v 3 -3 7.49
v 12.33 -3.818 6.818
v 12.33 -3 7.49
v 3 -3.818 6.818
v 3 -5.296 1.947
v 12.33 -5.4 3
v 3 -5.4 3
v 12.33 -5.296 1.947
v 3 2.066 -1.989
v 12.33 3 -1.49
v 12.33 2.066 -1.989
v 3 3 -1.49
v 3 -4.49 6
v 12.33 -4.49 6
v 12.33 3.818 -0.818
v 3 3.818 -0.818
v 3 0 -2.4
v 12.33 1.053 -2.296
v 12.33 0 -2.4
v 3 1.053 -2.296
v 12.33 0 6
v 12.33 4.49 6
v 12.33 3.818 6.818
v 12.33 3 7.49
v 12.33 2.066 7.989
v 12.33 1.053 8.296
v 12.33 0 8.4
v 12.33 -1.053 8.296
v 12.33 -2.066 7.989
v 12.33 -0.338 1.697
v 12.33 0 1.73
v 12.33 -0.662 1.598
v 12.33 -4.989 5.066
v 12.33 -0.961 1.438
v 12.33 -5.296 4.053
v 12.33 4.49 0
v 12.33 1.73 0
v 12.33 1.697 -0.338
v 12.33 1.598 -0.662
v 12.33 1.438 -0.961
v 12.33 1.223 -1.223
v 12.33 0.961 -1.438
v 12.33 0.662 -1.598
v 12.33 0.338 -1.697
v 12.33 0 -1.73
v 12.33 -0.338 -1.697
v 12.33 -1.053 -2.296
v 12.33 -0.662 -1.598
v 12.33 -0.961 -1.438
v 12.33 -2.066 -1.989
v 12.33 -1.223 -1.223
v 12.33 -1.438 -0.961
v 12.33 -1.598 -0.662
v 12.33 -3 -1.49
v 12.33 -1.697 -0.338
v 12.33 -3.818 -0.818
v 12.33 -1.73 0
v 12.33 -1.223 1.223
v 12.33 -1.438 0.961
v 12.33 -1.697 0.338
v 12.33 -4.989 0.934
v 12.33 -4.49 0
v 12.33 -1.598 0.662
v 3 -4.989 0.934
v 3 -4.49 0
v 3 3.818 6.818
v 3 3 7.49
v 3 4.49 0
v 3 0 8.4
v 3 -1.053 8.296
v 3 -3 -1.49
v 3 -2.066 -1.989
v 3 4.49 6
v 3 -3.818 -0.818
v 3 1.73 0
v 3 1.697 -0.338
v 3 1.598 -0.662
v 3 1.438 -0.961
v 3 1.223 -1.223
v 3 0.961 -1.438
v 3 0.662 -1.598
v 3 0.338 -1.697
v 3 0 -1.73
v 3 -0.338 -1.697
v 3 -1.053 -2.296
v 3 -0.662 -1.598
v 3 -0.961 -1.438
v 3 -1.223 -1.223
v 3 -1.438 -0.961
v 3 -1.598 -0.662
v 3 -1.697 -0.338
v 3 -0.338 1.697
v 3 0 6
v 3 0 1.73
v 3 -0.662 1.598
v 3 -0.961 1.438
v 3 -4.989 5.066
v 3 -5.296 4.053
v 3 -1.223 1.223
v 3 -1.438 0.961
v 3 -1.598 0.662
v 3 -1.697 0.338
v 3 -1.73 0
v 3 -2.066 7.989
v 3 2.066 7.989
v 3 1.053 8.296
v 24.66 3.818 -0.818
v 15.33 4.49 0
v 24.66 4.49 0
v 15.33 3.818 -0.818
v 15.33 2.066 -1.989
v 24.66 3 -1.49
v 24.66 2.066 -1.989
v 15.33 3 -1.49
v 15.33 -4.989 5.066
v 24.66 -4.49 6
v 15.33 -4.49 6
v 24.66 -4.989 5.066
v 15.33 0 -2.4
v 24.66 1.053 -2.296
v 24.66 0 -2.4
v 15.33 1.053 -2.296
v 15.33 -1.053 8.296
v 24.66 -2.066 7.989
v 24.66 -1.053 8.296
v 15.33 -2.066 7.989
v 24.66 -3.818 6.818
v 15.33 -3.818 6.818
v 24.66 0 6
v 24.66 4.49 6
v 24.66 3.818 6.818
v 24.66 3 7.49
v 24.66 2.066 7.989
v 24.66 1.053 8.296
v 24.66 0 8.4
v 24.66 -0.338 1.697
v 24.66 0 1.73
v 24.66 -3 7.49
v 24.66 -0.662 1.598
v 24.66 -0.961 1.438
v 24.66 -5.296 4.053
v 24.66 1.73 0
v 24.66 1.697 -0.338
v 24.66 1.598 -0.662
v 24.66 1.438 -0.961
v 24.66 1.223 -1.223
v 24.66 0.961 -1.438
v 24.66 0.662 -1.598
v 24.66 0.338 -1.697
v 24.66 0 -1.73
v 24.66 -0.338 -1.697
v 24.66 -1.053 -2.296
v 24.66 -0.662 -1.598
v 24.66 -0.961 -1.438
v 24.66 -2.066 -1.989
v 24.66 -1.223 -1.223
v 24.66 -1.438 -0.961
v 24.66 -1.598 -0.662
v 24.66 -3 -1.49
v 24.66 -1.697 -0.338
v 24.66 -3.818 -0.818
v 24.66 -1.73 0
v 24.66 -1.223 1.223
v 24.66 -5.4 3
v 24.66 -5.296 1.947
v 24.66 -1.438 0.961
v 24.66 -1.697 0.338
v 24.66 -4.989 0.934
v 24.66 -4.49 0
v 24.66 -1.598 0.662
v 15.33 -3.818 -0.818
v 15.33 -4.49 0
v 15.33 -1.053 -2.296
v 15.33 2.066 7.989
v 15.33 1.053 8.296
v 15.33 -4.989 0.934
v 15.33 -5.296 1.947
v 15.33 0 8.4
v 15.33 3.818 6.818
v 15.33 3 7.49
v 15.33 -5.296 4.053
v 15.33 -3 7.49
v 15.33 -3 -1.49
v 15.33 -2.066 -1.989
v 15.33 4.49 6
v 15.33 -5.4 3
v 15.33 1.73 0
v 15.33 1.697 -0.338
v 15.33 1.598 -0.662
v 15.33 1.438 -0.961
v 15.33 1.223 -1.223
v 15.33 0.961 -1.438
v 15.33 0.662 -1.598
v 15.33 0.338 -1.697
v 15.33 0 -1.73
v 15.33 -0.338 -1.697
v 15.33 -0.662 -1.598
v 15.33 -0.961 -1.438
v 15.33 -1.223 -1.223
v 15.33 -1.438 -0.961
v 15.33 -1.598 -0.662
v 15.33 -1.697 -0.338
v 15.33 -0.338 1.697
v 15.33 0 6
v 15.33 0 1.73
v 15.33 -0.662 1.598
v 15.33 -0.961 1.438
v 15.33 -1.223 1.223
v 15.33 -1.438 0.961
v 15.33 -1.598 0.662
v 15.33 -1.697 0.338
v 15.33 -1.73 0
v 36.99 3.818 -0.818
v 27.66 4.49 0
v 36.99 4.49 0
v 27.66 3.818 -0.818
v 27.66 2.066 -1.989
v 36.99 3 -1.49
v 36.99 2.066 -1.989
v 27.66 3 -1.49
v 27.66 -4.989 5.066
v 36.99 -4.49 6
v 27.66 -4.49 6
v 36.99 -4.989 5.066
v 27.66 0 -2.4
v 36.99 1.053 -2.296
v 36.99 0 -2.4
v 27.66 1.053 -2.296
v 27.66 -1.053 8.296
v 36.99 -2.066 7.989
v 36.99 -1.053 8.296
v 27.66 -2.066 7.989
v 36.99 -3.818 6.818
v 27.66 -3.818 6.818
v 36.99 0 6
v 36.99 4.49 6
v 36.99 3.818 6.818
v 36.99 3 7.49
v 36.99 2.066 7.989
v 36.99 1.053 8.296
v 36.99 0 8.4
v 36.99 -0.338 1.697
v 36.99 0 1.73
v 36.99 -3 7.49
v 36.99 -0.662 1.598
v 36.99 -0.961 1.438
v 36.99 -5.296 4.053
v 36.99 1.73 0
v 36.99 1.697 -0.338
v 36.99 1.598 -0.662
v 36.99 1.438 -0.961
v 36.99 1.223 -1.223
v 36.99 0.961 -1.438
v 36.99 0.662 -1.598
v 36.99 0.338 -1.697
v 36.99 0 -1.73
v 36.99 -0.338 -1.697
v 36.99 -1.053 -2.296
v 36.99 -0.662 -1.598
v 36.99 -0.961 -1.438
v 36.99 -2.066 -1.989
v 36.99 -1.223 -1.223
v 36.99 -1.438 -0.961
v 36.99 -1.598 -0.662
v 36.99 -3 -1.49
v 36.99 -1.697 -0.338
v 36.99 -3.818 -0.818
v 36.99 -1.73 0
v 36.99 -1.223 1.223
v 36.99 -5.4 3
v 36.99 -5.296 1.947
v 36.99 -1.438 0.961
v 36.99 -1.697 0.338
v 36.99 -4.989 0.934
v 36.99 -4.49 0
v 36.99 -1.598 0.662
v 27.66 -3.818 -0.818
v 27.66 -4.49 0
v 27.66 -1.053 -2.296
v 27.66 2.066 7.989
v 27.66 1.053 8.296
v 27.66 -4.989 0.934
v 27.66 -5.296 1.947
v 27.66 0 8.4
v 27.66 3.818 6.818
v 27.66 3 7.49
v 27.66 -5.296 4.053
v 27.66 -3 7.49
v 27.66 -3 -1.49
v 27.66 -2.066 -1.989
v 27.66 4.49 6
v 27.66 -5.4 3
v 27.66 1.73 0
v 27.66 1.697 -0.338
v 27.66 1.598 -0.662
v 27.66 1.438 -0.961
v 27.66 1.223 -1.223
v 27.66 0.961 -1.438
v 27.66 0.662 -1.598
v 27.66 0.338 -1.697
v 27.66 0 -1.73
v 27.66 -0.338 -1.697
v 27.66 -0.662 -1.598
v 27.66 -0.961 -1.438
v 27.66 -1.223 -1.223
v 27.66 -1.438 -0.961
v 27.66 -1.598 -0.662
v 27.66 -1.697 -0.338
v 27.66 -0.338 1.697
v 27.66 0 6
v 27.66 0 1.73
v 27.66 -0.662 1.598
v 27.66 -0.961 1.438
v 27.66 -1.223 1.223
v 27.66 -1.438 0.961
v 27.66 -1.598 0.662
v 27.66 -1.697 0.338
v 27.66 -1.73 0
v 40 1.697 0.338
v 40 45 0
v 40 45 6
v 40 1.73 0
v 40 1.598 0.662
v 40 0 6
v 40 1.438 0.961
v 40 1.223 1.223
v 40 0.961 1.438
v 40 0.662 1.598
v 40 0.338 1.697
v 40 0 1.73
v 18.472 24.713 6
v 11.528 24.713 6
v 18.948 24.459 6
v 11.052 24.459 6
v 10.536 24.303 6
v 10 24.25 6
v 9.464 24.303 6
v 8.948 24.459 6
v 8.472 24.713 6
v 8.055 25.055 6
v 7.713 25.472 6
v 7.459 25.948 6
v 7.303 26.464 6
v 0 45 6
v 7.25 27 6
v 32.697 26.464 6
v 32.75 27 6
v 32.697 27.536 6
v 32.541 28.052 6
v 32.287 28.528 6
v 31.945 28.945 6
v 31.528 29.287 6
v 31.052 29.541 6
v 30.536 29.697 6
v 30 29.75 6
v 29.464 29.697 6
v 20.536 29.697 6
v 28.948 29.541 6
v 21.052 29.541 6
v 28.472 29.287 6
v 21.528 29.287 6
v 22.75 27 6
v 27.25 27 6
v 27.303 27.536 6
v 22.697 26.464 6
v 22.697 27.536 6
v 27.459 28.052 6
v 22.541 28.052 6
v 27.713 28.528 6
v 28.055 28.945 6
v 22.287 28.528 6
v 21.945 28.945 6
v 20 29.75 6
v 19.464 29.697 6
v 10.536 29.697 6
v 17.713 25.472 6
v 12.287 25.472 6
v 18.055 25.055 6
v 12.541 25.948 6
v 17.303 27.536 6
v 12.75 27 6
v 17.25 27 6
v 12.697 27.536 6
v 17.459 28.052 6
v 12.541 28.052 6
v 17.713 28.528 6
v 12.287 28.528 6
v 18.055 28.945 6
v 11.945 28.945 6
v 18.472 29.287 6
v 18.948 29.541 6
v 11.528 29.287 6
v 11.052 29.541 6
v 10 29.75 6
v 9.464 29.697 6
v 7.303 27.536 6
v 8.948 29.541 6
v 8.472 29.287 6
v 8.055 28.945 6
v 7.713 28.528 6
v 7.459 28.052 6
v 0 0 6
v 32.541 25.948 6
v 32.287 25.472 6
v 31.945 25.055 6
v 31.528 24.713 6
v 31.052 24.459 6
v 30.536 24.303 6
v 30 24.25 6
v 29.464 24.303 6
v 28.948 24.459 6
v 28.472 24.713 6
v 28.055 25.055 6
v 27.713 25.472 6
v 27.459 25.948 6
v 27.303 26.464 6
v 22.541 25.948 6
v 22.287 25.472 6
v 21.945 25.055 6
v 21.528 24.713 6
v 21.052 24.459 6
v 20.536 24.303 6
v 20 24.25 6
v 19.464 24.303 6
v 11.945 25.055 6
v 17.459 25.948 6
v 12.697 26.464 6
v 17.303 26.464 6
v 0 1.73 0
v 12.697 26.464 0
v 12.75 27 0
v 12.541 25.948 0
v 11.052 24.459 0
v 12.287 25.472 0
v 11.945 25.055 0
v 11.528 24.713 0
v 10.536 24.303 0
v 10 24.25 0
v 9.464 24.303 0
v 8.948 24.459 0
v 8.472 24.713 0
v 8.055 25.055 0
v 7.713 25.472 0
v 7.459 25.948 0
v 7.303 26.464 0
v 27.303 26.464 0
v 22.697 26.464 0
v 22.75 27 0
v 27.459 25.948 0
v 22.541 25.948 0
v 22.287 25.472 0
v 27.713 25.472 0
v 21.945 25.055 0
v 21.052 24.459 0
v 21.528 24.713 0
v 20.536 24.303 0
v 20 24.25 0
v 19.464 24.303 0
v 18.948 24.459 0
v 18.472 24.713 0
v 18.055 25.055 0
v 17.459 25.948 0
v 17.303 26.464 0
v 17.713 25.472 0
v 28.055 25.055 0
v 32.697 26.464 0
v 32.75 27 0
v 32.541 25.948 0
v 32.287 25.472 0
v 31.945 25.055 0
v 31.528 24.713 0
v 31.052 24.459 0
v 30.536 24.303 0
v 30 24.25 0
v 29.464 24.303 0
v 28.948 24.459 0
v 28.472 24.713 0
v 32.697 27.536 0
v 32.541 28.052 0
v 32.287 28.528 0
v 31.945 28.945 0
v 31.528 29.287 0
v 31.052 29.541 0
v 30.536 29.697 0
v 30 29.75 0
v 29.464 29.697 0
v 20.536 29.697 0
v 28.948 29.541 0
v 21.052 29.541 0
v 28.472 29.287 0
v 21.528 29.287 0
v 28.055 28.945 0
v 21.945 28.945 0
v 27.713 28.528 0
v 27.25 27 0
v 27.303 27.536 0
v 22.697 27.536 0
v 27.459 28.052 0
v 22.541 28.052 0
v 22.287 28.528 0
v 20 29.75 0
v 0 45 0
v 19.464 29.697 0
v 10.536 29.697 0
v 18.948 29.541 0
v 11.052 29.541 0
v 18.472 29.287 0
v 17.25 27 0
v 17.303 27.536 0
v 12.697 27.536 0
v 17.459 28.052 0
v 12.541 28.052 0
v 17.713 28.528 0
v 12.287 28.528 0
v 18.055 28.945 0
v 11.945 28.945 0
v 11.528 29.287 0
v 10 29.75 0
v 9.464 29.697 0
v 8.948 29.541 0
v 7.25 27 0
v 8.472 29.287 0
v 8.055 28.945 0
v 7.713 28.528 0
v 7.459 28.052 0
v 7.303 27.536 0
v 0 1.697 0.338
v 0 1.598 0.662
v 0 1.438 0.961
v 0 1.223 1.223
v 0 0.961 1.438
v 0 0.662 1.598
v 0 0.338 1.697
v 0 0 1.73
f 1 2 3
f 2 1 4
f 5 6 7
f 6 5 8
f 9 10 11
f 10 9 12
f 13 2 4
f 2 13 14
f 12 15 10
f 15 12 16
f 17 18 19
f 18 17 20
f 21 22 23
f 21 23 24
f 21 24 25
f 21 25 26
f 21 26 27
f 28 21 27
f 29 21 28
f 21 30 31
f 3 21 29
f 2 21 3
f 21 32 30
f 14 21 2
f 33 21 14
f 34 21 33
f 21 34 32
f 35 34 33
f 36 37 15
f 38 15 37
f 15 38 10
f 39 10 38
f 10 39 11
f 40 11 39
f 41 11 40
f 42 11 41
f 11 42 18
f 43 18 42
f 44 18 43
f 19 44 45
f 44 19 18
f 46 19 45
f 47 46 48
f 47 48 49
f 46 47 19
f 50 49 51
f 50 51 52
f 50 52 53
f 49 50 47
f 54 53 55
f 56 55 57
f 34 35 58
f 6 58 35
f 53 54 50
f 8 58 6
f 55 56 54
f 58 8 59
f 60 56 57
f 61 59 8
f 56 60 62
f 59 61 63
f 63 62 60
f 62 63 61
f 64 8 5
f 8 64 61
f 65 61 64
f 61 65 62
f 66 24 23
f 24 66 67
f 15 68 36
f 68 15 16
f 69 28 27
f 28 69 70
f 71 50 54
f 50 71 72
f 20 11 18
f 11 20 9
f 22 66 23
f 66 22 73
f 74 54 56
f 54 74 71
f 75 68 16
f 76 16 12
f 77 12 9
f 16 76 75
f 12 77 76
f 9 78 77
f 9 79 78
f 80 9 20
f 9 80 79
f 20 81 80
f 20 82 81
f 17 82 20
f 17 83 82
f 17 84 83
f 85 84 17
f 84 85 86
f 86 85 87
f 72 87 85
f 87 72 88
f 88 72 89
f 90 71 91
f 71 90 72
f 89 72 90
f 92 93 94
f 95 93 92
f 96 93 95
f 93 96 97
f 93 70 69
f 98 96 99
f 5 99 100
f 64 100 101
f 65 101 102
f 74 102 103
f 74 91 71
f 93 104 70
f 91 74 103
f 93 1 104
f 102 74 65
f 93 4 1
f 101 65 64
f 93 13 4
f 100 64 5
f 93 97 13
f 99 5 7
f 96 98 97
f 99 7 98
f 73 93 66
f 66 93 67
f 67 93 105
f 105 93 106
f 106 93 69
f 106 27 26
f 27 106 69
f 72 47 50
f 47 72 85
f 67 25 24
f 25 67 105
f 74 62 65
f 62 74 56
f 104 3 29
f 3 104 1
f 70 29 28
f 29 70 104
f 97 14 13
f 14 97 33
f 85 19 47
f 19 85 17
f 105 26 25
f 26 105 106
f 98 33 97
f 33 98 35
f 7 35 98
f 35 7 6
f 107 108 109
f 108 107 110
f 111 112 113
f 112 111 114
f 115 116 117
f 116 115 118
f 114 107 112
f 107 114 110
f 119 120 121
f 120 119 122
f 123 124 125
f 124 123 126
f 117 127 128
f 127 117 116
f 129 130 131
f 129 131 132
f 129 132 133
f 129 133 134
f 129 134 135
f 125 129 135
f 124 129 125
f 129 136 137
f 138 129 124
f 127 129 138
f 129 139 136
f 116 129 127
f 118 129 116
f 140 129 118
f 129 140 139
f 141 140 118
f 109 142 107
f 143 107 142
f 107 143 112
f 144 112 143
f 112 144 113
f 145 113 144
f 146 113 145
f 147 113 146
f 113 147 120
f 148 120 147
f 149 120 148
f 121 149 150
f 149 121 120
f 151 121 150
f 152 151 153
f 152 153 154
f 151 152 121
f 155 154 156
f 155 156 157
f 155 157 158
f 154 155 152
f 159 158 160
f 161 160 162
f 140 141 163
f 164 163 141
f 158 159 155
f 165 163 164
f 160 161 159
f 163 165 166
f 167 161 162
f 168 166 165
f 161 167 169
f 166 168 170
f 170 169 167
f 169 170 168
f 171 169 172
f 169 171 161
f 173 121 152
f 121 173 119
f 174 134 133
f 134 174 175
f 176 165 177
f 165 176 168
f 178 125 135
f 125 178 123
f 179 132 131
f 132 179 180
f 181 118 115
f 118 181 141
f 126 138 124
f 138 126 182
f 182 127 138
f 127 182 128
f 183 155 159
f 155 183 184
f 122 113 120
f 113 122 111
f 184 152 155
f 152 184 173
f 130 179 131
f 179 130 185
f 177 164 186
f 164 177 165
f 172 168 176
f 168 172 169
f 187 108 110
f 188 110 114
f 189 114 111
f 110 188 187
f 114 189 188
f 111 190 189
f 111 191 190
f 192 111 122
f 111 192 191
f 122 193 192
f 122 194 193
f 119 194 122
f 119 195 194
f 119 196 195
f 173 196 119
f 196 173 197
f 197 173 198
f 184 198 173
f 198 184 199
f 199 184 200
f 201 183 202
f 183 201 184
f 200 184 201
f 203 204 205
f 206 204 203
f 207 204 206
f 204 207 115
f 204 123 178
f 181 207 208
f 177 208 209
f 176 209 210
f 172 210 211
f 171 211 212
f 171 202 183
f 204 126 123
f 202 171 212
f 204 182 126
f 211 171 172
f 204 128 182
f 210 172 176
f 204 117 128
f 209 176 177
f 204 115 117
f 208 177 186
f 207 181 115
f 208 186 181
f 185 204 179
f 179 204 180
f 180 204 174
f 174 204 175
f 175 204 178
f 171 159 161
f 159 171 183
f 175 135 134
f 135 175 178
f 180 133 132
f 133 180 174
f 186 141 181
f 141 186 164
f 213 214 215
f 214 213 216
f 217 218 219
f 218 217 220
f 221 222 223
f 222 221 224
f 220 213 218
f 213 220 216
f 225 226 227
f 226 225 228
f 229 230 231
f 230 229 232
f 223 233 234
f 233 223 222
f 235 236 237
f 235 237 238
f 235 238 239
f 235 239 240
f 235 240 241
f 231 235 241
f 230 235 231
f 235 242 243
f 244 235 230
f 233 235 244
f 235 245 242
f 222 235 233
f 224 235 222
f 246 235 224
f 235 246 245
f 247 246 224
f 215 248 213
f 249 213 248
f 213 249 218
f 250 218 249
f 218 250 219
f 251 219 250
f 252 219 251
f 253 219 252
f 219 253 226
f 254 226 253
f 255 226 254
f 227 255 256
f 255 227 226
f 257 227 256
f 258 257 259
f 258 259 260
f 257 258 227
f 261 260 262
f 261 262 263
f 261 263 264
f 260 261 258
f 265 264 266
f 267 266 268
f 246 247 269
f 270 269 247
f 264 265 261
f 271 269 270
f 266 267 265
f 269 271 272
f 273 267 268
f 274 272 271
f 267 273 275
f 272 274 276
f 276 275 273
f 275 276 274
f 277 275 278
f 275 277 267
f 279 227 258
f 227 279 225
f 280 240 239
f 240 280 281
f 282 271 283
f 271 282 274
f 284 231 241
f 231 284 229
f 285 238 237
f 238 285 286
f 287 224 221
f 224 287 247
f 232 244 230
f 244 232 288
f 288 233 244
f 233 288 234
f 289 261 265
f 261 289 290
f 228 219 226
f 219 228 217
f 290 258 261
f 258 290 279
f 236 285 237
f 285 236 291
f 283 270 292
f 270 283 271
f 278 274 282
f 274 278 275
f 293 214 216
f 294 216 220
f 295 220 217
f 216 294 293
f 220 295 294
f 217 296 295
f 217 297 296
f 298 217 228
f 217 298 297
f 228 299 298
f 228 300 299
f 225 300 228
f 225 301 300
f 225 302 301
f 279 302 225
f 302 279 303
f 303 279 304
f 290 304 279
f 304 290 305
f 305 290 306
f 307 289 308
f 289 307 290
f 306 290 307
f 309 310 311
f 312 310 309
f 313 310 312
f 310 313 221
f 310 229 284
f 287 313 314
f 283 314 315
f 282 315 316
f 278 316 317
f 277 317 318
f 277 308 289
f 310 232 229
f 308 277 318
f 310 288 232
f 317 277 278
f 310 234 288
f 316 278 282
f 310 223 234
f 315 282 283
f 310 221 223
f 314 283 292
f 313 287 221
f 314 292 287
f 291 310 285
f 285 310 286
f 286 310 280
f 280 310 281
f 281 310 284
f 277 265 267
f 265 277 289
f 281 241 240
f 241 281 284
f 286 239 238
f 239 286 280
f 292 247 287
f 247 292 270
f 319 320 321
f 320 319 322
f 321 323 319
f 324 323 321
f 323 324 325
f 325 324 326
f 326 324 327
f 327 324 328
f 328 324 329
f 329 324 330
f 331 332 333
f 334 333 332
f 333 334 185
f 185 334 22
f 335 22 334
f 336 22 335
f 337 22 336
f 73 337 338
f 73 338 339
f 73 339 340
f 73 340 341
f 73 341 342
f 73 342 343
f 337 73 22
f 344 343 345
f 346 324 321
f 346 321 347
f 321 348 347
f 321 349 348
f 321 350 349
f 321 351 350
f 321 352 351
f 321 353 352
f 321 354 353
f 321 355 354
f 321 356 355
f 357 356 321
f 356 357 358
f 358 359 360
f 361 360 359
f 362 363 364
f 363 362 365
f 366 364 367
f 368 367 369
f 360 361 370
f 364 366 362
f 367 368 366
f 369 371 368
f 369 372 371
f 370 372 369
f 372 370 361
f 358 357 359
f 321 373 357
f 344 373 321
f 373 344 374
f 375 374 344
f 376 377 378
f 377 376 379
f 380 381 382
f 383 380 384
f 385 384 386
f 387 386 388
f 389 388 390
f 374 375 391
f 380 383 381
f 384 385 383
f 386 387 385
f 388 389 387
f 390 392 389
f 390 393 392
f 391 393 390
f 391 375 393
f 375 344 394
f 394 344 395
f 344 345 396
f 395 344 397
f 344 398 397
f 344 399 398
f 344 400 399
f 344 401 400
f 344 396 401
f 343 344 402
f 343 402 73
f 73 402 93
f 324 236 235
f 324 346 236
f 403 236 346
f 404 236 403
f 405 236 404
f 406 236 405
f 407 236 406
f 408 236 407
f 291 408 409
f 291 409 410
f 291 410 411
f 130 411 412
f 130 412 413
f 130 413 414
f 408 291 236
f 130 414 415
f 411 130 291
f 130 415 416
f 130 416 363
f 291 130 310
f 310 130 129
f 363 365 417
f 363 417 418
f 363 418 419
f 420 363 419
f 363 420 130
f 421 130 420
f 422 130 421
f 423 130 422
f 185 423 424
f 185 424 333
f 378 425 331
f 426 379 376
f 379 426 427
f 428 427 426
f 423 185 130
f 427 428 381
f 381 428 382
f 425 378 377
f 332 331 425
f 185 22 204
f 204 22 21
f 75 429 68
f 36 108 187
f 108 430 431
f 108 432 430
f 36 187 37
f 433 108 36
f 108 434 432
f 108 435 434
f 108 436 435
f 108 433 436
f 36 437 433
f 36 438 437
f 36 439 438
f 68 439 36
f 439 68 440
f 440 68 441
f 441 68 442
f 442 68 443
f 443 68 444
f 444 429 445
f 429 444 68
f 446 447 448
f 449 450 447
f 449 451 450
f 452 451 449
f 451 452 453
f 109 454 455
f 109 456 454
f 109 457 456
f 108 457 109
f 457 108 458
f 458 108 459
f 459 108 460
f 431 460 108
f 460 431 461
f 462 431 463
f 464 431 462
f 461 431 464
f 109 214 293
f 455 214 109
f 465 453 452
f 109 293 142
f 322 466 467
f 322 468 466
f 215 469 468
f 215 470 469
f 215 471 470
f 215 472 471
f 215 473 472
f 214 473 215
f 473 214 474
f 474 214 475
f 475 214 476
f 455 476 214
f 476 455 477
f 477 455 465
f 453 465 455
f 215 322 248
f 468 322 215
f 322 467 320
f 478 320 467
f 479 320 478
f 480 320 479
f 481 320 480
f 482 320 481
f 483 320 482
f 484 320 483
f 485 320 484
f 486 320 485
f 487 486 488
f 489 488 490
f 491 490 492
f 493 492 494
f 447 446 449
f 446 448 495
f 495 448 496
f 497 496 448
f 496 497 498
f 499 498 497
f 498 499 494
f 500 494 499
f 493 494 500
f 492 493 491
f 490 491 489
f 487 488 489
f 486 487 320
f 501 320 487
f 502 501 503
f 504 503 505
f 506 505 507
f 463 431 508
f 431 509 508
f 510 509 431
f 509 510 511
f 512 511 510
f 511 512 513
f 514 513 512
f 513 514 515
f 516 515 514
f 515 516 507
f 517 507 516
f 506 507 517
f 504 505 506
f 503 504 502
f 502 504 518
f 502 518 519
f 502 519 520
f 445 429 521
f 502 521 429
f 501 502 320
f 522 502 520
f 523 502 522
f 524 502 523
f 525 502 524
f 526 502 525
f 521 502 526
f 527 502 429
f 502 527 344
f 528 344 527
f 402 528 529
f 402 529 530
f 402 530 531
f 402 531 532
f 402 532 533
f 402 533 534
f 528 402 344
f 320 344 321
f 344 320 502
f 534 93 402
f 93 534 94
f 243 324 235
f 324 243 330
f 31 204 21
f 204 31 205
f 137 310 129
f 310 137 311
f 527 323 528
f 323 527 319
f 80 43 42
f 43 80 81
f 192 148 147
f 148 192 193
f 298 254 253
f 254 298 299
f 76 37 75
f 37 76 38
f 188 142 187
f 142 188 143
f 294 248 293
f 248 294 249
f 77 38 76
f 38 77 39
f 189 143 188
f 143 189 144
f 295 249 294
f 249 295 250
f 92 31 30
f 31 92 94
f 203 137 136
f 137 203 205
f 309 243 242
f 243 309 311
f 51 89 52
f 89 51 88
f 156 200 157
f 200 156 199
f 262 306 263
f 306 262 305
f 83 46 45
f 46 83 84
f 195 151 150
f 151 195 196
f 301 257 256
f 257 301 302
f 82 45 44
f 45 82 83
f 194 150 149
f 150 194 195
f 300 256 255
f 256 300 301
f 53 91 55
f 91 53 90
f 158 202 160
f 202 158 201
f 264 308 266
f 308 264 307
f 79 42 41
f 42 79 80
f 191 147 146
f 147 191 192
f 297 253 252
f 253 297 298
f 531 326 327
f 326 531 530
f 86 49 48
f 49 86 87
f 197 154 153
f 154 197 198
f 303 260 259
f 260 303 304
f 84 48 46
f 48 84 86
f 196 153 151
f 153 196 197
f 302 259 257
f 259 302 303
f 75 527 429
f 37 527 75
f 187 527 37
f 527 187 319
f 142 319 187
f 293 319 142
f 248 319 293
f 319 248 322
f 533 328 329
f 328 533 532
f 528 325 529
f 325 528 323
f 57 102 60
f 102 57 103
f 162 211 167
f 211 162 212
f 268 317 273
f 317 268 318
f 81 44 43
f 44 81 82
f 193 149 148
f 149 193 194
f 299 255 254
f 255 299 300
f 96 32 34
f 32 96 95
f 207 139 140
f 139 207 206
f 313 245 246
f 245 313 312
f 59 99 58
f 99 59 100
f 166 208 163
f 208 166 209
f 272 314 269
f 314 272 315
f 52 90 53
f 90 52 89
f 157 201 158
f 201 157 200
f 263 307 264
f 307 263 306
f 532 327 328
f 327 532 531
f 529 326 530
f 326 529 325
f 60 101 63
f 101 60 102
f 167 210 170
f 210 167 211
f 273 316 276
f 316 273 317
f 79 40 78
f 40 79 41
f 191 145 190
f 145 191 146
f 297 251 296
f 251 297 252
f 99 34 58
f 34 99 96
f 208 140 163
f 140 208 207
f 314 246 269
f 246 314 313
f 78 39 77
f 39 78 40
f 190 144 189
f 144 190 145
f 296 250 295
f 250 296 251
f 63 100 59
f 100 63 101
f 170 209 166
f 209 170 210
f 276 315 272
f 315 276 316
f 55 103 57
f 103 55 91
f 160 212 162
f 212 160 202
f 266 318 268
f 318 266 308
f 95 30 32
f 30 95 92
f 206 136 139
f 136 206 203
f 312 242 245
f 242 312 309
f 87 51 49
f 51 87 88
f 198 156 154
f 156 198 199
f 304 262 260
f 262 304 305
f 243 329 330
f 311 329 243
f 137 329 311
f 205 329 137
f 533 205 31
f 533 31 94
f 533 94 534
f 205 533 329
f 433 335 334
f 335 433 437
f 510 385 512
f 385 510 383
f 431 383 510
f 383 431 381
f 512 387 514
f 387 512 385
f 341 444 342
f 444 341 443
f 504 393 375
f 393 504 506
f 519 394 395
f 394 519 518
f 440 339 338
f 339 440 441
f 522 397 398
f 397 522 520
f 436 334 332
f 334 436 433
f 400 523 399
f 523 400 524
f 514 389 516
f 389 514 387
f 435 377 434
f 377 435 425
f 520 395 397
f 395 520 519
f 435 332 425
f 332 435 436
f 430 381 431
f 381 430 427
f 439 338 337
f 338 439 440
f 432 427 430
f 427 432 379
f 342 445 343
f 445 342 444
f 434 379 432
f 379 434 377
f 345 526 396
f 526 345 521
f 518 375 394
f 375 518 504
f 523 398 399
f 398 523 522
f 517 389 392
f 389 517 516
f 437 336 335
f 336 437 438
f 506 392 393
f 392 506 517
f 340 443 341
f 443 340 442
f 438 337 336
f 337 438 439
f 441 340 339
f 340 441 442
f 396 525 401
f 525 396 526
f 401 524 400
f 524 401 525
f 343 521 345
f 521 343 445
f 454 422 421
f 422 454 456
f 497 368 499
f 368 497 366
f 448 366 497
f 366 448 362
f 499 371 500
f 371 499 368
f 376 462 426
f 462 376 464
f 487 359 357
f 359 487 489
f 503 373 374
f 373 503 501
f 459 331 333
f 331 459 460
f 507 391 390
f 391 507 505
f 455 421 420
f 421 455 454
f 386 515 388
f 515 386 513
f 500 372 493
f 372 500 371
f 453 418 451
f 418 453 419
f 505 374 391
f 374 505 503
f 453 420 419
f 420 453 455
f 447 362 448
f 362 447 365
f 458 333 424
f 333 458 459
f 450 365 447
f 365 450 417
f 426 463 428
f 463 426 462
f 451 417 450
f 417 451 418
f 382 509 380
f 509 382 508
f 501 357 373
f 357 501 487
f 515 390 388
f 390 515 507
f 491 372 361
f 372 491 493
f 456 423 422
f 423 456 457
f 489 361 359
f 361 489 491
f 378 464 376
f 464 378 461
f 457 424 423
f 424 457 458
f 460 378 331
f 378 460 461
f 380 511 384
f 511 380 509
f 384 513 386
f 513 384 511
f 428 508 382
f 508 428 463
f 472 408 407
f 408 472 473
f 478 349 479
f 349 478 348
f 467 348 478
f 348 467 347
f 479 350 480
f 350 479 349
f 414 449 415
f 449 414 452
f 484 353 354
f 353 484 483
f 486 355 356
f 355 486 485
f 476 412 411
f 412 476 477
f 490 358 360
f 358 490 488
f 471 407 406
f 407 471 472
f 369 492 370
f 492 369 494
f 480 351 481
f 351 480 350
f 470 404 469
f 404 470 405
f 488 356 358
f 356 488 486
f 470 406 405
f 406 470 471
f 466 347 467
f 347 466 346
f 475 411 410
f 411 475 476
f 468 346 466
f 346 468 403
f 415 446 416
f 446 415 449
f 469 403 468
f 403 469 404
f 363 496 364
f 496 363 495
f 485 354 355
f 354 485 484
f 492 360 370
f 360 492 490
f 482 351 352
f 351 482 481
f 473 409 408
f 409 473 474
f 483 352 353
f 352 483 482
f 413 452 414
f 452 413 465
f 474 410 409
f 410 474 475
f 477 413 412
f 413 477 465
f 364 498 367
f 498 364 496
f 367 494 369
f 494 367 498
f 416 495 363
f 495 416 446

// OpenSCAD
$fn = 32;

// ----------------------------------------------------------------------
// Hinge leaf: 40 x 50.4 x 10.8 mm
// ----------------------------------------------------------------------

// --- parameters (mm) ---
plate_len = 40;           // leaf length, X
plate_w = 45;             // leaf width, Y
plate_t = 6;              // leaf thickness
barrel_d = 10.8;          // knuckle diameter
barrel_w = 9.33;          // knuckle width
knuckle_n = 3;            // number of knuckles
pin_d = 3.46;             // pin bore
gap = 3;                  // gap between the knuckles
screw_d = 5.5;            // screw clearance

module leaf() {
  cube([plate_len, plate_w, plate_t]);
}

module knuckles() {
  /* barrels sit on the leaf edge, the pin axis at half the leaf thickness */
  for (i = [0 : knuckle_n - 1])
    translate([gap + i * (barrel_w + gap), 0, plate_t * 0.5])
      rotate([0, 90, 0]) cylinder(h = barrel_w, d = barrel_d);
}

difference() {
  union() {
    leaf();
    knuckles();
  }
  rotate([0, 90, 0]) translate([0, 0, -1])
    cylinder(h = plate_len + 2, d = pin_d);
  translate([10, plate_w * 0.6, -1]) cylinder(h = plate_t + 2, d = screw_d);
  translate([20, plate_w * 0.6, -1]) cylinder(h = plate_t + 2, d = screw_d);
  translate([30, plate_w * 0.6, -1]) cylinder(h = plate_t + 2, d = screw_d);
}
